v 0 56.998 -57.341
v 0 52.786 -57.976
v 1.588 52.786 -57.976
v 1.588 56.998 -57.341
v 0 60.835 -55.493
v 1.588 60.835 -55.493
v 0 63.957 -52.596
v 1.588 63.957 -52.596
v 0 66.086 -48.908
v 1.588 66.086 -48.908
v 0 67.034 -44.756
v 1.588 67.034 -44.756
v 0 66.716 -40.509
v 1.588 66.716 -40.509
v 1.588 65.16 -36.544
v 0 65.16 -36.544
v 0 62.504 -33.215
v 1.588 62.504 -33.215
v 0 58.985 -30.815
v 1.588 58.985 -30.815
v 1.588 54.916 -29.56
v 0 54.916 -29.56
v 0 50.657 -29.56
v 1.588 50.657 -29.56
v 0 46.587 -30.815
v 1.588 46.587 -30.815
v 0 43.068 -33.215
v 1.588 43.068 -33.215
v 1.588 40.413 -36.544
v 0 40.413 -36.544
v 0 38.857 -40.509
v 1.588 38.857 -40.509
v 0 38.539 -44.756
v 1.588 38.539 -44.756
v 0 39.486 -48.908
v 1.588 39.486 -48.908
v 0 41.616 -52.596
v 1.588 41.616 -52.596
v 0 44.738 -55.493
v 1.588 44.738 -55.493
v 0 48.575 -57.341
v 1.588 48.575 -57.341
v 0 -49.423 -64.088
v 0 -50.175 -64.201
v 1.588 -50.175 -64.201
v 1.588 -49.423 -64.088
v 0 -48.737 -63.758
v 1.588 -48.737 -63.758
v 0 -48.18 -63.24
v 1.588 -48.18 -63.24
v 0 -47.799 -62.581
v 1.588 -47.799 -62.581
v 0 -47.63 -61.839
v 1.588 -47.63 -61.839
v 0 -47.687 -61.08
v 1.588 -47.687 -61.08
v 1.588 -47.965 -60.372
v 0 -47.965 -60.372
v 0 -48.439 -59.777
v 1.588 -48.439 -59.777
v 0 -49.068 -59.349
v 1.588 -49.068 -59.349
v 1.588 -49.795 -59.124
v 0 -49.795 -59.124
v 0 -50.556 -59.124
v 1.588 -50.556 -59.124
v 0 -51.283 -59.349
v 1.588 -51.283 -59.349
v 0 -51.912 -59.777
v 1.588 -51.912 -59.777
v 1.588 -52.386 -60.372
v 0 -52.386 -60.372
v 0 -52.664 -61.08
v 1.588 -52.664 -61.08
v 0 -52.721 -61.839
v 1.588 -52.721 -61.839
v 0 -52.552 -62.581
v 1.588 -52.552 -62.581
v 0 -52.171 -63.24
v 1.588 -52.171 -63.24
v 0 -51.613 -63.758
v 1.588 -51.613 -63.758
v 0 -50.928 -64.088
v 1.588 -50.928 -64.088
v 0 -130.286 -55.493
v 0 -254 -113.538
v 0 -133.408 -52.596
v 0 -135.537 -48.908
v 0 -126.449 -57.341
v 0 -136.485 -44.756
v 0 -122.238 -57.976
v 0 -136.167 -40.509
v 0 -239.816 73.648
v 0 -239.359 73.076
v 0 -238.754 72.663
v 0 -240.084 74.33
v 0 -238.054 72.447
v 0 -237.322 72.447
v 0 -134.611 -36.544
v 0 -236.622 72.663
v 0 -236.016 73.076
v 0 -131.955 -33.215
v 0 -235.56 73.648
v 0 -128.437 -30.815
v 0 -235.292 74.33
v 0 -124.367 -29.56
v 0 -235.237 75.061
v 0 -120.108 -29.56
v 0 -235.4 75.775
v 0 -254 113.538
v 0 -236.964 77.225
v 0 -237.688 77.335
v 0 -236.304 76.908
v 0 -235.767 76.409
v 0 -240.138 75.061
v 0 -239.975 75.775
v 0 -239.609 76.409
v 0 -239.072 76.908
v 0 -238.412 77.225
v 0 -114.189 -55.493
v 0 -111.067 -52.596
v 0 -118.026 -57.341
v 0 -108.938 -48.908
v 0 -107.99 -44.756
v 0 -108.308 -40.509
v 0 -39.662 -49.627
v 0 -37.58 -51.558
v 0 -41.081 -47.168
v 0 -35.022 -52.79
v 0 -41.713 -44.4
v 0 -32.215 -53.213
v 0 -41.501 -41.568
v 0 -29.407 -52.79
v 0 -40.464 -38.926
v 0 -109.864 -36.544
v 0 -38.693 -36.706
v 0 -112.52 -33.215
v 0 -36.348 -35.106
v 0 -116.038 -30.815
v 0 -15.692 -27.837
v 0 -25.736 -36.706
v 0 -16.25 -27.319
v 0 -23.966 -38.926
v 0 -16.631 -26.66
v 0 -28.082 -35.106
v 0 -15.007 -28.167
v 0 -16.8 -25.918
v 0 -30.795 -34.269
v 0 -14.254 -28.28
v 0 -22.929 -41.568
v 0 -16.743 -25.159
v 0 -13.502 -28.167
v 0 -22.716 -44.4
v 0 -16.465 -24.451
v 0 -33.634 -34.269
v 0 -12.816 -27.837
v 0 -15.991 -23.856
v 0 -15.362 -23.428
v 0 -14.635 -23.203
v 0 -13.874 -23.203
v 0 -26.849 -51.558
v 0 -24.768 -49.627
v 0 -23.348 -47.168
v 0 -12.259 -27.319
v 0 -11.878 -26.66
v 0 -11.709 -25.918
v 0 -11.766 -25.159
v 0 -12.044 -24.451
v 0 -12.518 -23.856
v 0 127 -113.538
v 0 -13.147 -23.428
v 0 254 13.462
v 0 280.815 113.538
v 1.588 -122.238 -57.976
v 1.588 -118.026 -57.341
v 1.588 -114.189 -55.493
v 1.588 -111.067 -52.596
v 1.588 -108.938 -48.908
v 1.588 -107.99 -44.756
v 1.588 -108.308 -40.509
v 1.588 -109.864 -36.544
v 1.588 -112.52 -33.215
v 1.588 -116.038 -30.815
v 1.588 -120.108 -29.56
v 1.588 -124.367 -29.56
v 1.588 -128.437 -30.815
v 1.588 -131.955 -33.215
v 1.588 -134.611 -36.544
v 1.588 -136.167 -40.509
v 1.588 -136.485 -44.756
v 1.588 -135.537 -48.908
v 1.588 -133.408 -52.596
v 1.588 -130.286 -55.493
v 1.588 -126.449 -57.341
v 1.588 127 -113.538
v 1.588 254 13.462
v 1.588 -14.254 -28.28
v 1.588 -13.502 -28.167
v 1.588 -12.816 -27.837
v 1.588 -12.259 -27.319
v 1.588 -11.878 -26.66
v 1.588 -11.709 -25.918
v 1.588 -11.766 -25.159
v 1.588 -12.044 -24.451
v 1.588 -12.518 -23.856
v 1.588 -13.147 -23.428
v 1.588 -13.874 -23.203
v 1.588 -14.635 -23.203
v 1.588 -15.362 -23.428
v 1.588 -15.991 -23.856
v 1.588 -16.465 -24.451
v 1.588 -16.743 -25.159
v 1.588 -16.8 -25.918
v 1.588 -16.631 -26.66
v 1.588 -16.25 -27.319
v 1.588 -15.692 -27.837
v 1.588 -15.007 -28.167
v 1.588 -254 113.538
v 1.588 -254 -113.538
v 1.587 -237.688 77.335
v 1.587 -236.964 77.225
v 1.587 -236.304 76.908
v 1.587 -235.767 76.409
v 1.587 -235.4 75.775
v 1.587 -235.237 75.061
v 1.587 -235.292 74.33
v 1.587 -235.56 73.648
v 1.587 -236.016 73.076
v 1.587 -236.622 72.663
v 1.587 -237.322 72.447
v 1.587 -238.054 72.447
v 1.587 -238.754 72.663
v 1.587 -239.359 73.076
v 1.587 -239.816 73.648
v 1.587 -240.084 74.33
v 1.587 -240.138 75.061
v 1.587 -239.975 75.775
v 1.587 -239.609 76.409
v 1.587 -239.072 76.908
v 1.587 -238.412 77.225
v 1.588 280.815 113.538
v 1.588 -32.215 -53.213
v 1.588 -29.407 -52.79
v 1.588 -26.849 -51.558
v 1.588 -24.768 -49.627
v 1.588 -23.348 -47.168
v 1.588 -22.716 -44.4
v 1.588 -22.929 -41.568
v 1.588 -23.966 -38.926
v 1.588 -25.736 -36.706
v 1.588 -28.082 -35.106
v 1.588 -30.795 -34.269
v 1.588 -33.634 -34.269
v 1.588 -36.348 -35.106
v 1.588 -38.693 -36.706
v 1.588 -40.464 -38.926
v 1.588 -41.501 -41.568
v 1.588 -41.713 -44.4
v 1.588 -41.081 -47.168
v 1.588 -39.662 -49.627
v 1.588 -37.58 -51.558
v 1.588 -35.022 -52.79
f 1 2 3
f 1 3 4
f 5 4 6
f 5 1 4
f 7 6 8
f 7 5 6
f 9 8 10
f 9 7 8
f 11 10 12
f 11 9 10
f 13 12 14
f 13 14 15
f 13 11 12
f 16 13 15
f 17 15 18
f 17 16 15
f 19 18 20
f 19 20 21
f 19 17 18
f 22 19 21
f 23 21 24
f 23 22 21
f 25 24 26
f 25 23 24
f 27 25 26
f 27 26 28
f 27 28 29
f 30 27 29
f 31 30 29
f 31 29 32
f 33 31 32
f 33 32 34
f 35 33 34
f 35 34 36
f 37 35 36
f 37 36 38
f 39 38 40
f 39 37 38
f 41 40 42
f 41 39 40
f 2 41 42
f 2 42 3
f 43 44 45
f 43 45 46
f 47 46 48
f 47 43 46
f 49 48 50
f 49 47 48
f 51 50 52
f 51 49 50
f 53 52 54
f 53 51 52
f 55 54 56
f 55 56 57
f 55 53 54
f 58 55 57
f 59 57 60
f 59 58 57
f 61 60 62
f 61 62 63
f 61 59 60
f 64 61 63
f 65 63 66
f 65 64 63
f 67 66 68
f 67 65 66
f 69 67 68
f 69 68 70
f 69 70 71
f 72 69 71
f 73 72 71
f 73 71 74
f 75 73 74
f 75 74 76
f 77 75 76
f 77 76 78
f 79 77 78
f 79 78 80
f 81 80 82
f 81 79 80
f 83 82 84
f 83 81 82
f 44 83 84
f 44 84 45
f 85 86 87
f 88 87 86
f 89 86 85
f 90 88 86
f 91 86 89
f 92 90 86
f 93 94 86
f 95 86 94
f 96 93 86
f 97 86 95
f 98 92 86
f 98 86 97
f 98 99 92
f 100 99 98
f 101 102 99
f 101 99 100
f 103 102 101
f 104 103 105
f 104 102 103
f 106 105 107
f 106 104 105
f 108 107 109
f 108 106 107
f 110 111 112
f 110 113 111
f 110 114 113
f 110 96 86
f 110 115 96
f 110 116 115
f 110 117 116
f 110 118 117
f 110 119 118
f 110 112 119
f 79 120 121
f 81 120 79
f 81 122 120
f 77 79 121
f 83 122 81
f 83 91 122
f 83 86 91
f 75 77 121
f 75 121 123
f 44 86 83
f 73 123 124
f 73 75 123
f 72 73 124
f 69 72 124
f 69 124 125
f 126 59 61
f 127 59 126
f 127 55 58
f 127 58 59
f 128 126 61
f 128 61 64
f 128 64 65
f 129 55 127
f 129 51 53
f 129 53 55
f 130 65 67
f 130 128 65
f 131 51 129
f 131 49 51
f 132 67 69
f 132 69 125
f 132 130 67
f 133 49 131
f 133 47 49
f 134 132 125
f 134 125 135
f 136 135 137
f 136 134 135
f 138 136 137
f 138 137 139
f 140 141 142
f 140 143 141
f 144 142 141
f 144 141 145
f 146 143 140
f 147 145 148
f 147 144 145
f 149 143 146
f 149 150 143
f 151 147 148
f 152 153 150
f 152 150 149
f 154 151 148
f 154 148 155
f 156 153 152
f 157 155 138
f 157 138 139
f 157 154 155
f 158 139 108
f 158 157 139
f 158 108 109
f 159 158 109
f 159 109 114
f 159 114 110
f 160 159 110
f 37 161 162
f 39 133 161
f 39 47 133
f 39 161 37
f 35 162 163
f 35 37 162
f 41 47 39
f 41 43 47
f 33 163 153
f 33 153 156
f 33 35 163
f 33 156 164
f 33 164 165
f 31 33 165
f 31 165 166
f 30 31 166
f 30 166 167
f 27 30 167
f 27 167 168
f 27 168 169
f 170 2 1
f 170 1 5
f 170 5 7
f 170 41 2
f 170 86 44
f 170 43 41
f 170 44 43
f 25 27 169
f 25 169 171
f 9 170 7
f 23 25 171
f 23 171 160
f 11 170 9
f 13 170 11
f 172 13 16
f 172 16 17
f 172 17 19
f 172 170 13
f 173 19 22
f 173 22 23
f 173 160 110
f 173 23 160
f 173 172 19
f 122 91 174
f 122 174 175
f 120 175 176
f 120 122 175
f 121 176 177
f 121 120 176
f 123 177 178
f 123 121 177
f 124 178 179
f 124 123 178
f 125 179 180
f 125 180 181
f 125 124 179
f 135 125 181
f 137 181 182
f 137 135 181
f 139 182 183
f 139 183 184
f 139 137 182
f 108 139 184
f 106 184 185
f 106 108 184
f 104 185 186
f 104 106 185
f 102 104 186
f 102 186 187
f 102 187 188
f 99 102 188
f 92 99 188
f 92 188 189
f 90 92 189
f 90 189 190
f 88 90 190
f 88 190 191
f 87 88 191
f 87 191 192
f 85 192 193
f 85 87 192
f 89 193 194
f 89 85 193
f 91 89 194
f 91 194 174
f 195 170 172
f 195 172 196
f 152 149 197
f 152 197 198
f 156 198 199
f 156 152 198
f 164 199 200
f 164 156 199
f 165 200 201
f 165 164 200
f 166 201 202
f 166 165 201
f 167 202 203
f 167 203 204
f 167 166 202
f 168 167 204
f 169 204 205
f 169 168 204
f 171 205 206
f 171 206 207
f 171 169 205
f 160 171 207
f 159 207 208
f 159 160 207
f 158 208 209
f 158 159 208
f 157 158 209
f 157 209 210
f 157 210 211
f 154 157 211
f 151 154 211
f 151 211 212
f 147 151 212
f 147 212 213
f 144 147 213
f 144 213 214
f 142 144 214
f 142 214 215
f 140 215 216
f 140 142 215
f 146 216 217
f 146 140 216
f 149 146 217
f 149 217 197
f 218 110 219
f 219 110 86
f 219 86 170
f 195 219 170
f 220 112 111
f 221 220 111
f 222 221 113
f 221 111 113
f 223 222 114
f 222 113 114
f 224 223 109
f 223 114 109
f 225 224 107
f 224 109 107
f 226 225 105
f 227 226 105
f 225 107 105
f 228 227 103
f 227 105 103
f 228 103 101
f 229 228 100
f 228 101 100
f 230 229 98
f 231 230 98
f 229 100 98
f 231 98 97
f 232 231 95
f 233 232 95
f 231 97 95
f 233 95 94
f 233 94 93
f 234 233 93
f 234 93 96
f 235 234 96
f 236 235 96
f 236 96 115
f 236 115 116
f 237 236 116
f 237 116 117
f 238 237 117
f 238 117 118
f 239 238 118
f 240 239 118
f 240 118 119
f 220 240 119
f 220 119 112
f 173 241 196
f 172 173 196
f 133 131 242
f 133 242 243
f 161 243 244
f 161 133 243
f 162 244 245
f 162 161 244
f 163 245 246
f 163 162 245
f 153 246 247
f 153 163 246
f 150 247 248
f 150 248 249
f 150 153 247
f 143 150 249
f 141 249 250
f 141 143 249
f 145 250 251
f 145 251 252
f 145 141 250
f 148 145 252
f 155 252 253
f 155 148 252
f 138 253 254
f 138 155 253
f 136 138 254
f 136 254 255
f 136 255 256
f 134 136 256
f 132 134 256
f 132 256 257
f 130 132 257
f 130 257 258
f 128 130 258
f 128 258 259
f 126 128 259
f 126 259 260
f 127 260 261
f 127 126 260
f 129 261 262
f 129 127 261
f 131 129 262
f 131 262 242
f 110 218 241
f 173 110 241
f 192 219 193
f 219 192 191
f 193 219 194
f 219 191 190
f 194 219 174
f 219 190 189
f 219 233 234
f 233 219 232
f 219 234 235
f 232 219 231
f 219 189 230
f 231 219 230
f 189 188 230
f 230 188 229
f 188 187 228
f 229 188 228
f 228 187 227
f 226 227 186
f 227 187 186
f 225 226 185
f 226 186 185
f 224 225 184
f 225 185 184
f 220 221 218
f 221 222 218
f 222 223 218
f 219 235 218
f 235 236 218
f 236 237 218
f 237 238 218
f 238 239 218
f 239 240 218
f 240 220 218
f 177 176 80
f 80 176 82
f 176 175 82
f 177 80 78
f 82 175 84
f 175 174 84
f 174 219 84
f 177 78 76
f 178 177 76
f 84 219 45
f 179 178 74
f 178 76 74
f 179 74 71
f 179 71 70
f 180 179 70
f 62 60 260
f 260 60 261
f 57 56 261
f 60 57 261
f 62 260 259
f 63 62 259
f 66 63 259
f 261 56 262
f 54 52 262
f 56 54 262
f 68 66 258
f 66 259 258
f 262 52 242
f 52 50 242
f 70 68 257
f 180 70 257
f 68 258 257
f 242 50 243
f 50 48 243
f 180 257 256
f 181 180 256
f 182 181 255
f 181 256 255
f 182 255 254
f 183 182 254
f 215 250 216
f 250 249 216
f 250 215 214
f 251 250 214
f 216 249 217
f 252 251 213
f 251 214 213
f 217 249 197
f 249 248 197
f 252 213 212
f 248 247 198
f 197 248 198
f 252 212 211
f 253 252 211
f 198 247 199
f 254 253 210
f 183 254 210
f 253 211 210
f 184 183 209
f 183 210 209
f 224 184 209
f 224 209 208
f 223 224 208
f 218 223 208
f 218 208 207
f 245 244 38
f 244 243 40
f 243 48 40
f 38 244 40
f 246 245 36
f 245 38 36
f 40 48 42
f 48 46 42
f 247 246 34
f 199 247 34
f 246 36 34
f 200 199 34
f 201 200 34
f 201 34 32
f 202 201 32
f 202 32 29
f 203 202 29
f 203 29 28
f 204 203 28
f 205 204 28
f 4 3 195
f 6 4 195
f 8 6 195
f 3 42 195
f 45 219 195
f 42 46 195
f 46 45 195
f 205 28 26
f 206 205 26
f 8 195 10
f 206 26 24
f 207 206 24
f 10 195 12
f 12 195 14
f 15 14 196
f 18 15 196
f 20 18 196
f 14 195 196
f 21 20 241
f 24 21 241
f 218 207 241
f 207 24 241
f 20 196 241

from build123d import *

# Parameters (mm, degrees)
BOSS_EXTRUDE1_OUTLINE_W   = 227.076
BOSS_EXTRUDE1_OUTLINE_H   = 508
BOSS_EXTRUDE1_OUTLINE_R   = 14.2875
BOSS_EXTRUDE1_OUTLINE_R_2 = 2.5527
BOSS_EXTRUDE1_OUTLINE_R_3 = 9.525
BOSS_EXTRUDE1_DEPTH       = 1.5875
F_8_CLEARANCE_HOLE1_D     = 4.9149
CHAMFER1_SIZE             = 127
BOSS_EXTRUDE2_DEPTH       = 1.5875


# Read off the part's stored shape, not the designer's step: Boss-Extrude1
with BuildPart() as part:
    # Boss-Extrude1 outline → Boss-Extrude1 (new body)
    with BuildSketch(Plane(origin=(0, 0, 0), x_dir=(0, 0, -1), z_dir=(1, 0, 0))):
        Rectangle(BOSS_EXTRUDE1_OUTLINE_W, BOSS_EXTRUDE1_OUTLINE_H)
        with Locations((43.688, -122.2375)):
            Circle(BOSS_EXTRUDE1_OUTLINE_R, mode=Mode.SUBTRACT)
        with Locations((25.727487758, -14.254307758)):
            Circle(BOSS_EXTRUDE1_OUTLINE_R_2, mode=Mode.SUBTRACT)
        with Locations((43.688, -32.21482)):
            Circle(BOSS_EXTRUDE1_OUTLINE_R_3, mode=Mode.SUBTRACT)
        with Locations((61.648512242, -50.175332242)):
            Circle(BOSS_EXTRUDE1_OUTLINE_R_2, mode=Mode.SUBTRACT)
        with Locations((43.688, 52.78628)):
            Circle(BOSS_EXTRUDE1_OUTLINE_R, mode=Mode.SUBTRACT)
    extrude(amount=BOSS_EXTRUDE1_DEPTH)

    # #8 Clearance Hole1 (through all)
    with Locations(Plane(origin=(1.5875, 0, 0), x_dir=(0, 0, -1), z_dir=(1, 0, 0))):
        with Locations((-74.877168, -237.687866)):
            Hole(F_8_CLEARANCE_HOLE1_D / 2)

    # Chamfer1
    chamfer1_edges = [part.edges().sort_by_distance(p)[0] for p in [
        (0.79375, 254, -113.538),
    ]]
    chamfer(chamfer1_edges, length=CHAMFER1_SIZE)

    # Sketch7 → Boss-Extrude2 (add, through all)
    with BuildSketch(Plane(origin=(1.5875, 0, 0), x_dir=(0, 0, -1), z_dir=(1, 0, 0))):
        Polygon((-113.538, 254), (-113.538, 280.815283382), (-13.462, 254), align=None)
    extrude(amount=-BOSS_EXTRUDE2_DEPTH)


solid = part.part
